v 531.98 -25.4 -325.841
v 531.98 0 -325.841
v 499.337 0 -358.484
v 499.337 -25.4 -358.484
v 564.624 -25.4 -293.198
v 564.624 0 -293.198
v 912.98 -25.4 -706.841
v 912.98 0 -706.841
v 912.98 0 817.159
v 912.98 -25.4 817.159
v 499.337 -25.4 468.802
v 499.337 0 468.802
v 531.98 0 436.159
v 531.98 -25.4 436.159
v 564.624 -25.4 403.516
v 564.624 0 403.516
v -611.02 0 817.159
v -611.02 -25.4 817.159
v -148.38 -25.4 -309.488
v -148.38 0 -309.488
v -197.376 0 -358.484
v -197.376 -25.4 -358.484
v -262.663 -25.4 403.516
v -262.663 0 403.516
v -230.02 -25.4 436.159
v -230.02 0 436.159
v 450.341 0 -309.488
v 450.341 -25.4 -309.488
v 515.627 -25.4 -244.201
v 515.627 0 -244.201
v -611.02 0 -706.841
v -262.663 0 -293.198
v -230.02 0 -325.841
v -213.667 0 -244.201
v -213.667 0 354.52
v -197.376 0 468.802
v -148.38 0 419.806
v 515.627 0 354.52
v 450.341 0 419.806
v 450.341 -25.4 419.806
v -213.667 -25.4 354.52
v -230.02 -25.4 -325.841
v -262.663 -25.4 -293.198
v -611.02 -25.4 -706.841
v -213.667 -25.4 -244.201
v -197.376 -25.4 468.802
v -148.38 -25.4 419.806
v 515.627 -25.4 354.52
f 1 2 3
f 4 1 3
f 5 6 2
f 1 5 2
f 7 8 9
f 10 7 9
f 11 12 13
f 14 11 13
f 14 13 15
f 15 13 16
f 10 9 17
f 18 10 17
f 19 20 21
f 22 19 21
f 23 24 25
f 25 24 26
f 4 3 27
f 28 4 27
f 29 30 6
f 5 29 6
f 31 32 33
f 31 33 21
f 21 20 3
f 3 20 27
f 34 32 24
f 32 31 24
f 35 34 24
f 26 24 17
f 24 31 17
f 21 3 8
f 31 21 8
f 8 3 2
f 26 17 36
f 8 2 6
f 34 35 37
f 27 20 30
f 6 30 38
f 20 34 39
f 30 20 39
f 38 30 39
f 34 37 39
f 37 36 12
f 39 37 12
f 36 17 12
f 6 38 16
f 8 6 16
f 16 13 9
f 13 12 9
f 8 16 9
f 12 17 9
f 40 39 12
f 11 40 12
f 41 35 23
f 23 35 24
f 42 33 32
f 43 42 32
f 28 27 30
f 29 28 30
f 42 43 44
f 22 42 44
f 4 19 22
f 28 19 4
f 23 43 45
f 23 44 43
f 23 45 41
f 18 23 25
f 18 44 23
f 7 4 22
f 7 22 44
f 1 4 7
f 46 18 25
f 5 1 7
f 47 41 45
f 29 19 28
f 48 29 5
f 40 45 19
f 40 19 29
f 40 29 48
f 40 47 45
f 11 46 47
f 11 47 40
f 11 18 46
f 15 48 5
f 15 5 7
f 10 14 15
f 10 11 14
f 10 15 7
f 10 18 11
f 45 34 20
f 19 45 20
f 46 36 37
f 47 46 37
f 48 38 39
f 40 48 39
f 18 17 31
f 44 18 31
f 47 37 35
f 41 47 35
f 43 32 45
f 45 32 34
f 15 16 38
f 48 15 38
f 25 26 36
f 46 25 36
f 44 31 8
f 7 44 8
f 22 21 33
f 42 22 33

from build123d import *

# Parameters (mm, degrees)
F0_W     = 254
F0_H     = 254
F1_DEPTH = 25.4


with BuildPart() as f1:
    # F0 (on Front) → F1 (new body)
    with BuildSketch(Plane.XZ):
        Polygon((-306.2196969569, 817.159200755), (-611.0196969569, 817.159200755), (-611.0196969569, 512.359200755), (-611.0196969569, 207.559200755), (-611.0196969569, -706.840799245), (912.9803030431, -706.840799245), (912.9803030431, 817.159200755), (-1.4196969569, 817.159200755), align=None)
        with Locations((-153.8196969569, -554.440799245)):
            Rectangle(F0_W, F0_H, mode=Mode.SUBTRACT)
        with Locations((-458.6196969569, -249.640799245)):
            Rectangle(F0_W, F0_H, mode=Mode.SUBTRACT)
        with Locations((455.7803030431, -554.440799245)):
            Rectangle(F0_W, F0_H, mode=Mode.SUBTRACT)
        with Locations((760.5803030431, -249.640799245)):
            Rectangle(F0_W, F0_H, mode=Mode.SUBTRACT)
        with Locations((-458.6196969569, 359.959200755)):
            Rectangle(F0_W, F0_H, mode=Mode.SUBTRACT)
        Polygon((608.1803030431, 512.359200755), (608.1803030431, -402.040799245), (-306.2196969569, -402.040799245), (-306.2196969569, 207.559200755), (-306.2196969569, 512.359200755), (-1.4196969569, 512.359200755), align=None, mode=Mode.SUBTRACT)
        with Locations((-153.8196969569, 664.759200755)):
            Rectangle(F0_W, F0_H, mode=Mode.SUBTRACT)
        with Locations((760.5803030431, 359.959200755)):
            Rectangle(F0_W, F0_H, mode=Mode.SUBTRACT)
        with Locations((455.7803030431, 664.759200755)):
            Rectangle(F0_W, F0_H, mode=Mode.SUBTRACT)
        Polygon((-306.2196969569, -402.040799245), (608.1803030431, -402.040799245), (608.1803030431, 512.359200755), (-1.4196969569, 512.359200755), (-306.2196969569, 512.359200755), (-306.2196969569, 207.559200755), align=None)
        Polygon((-179.2196969569, 486.959200755), (582.7803030431, 486.959200755), (582.7803030431, -376.640799245), (-280.8196969569, -376.640799245), (-280.8196969569, 385.359200755), (-280.8196969569, 486.959200755), align=None, mode=Mode.SUBTRACT)
        Polygon((582.7803030431, -376.640799245), (582.7803030431, 486.959200755), (-179.2196969569, 486.959200755), (-280.8196969569, 486.959200755), (-280.8196969569, 385.359200755), (-280.8196969569, -376.640799245), align=None)
        Polygon((-262.662927957, -293.197568245), (-213.6666505604, -244.2012908484), (-148.3801885602, -309.4877528486), (-197.3764659568, -358.4840302451), (-230.0196969569, -325.840799245), align=None, mode=Mode.SUBTRACT)
        Polygon((450.3407946465, -309.4877528486), (515.6272566467, -244.2012908484), (564.6235340432, -293.197568245), (531.9803030431, -325.840799245), (499.337072043, -358.4840302451), align=None, mode=Mode.SUBTRACT)
        Polygon((-230.0196969569, 436.159200755), (-197.3764659568, 468.802431755), (-148.3801885602, 419.8061543585), (-213.6666505604, 354.5196923583), (-262.662927957, 403.5159697549), align=None, mode=Mode.SUBTRACT)
        Polygon((564.6235340432, 403.5159697549), (515.6272566467, 354.5196923583), (450.3407946465, 419.8061543585), (499.337072043, 468.802431755), (531.9803030431, 436.159200755), align=None, mode=Mode.SUBTRACT)
        with Locations((-458.6196969569, 359.959200755)):
            Rectangle(F0_W, F0_H)
        with Locations((-153.8196969569, 664.759200755)):
            Rectangle(F0_W, F0_H)
        with Locations((455.7803030431, 664.759200755)):
            Rectangle(F0_W, F0_H)
        with Locations((760.5803030431, 359.959200755)):
            Rectangle(F0_W, F0_H)
        with Locations((760.5803030431, -249.640799245)):
            Rectangle(F0_W, F0_H)
        with Locations((455.7803030431, -554.440799245)):
            Rectangle(F0_W, F0_H)
        with Locations((-153.8196969569, -554.440799245)):
            Rectangle(F0_W, F0_H)
        with Locations((-458.6196969569, -249.640799245)):
            Rectangle(F0_W, F0_H)
    extrude(amount=F1_DEPTH)


solid = f1.part
